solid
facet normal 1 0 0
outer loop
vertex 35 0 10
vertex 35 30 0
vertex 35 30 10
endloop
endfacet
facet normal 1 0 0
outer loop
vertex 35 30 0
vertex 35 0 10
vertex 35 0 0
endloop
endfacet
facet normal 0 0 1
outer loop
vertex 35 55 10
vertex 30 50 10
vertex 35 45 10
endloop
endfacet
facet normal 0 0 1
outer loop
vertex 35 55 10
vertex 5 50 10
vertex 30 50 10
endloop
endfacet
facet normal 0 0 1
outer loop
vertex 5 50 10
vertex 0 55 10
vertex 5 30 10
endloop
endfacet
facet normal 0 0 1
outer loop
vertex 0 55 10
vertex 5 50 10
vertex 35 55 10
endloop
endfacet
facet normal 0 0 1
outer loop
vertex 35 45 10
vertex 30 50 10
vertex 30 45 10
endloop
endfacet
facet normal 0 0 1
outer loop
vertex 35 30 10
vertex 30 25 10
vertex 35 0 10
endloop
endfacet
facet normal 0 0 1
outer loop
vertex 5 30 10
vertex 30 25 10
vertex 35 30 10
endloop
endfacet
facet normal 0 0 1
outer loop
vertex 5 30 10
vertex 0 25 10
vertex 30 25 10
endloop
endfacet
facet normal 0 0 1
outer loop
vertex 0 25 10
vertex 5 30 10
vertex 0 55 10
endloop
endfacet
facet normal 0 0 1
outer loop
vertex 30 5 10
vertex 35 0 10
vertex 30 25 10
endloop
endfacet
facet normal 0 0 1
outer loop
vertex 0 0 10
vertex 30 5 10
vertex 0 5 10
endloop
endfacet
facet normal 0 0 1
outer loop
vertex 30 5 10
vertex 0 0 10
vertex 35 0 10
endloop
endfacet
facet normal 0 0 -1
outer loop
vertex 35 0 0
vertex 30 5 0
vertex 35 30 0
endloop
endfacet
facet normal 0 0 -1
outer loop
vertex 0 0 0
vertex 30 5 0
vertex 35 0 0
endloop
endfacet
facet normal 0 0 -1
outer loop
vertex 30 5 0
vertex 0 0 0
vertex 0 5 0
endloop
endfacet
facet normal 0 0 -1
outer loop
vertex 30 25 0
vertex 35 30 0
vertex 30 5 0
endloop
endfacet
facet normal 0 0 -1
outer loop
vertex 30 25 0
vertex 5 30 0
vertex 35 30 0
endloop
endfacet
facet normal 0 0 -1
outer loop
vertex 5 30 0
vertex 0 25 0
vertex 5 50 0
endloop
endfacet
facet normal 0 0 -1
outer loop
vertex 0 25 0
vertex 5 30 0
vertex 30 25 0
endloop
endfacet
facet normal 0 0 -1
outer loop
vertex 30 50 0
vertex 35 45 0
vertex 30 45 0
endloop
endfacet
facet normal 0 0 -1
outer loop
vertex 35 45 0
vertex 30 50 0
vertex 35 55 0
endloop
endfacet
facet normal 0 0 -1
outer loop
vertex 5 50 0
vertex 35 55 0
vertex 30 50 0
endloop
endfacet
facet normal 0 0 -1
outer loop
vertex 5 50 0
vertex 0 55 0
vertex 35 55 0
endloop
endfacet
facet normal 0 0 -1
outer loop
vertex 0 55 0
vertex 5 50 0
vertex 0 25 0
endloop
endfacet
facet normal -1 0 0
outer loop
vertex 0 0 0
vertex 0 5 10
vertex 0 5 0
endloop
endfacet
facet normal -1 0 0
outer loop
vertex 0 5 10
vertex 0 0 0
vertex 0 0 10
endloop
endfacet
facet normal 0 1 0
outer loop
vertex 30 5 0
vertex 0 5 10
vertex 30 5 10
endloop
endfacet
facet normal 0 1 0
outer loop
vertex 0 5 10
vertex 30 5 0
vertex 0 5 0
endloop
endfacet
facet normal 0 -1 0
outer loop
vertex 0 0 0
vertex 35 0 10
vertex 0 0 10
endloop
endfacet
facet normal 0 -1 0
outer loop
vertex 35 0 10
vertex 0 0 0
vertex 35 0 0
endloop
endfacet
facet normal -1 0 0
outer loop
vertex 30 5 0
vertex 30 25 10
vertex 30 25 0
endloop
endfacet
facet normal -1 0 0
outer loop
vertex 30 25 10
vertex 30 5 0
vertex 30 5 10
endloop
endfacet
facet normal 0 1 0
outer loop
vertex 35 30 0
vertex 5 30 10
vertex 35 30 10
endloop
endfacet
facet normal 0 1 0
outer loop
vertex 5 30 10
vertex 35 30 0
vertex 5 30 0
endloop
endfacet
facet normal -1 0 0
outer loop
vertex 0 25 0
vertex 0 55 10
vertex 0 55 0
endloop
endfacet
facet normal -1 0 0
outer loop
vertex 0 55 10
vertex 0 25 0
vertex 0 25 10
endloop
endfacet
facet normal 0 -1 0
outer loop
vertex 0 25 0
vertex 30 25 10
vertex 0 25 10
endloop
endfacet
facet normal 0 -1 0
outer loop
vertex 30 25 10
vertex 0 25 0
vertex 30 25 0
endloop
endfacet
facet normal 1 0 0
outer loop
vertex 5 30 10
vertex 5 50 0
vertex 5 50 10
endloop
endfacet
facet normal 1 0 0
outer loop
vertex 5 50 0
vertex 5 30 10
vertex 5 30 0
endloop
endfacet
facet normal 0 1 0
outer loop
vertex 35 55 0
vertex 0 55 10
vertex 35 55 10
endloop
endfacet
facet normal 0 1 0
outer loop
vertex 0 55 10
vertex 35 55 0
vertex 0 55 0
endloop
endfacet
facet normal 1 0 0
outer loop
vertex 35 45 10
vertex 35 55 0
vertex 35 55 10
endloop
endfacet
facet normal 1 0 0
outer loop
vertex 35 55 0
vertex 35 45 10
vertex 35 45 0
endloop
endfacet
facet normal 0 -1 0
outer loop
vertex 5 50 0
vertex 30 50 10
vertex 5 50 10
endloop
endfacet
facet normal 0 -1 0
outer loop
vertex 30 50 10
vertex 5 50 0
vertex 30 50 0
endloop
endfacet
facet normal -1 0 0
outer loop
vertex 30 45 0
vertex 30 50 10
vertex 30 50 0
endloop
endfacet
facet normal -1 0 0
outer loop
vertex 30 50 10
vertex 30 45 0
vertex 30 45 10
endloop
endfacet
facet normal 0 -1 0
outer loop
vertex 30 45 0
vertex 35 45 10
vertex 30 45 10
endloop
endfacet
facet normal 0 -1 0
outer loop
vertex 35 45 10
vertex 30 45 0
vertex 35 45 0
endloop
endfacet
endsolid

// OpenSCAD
// preview[view:north west, tilt:top diagonal]

/* [General] */
// How thick should be the hook itself ?
thickness = 5; // [1:100]
// What should be the width of the hook ?
width = 10; // [1:100]

/* [Shelf] */
// How thick is the shelf ?
shelf_height = 20; // [1:100]
// How long should be the shelf leg ?
shelf_deepness = 30; // [1:100]

/* [Hook] */
// How height of the hook leg ?
hook_height = 20; // [1:100]
// How long should be the hook leg ?
hook_deepness = 30; // [1:100]


union(){
//  ___
  cube([shelf_deepness+thickness,thickness,width]);
//  ___
//  |
  translate([shelf_deepness,0,0])
    cube([thickness,shelf_height +  2*thickness,width]);
  
//  ___
//  |
//  ---
  translate([shelf_deepness,shelf_height + thickness,width])
    rotate([0,180,0])
      cube([shelf_deepness, thickness,width]);
//  ___
//  |
//  ---
//    |
  translate([0,shelf_height+thickness,0])
      cube([thickness,hook_height+2*thickness,width]);
//  ___
//  |
//  ---
//     |
//  ---
  translate([thickness,shelf_height+hook_height+2*thickness,0])
    cube([hook_deepness,thickness,width]);

//  ___
//  |
//  ---
//     |
//  |---

  translate([hook_deepness,shelf_height+hook_height+thickness,0])
    cube([thickness,thickness,width]);
}
